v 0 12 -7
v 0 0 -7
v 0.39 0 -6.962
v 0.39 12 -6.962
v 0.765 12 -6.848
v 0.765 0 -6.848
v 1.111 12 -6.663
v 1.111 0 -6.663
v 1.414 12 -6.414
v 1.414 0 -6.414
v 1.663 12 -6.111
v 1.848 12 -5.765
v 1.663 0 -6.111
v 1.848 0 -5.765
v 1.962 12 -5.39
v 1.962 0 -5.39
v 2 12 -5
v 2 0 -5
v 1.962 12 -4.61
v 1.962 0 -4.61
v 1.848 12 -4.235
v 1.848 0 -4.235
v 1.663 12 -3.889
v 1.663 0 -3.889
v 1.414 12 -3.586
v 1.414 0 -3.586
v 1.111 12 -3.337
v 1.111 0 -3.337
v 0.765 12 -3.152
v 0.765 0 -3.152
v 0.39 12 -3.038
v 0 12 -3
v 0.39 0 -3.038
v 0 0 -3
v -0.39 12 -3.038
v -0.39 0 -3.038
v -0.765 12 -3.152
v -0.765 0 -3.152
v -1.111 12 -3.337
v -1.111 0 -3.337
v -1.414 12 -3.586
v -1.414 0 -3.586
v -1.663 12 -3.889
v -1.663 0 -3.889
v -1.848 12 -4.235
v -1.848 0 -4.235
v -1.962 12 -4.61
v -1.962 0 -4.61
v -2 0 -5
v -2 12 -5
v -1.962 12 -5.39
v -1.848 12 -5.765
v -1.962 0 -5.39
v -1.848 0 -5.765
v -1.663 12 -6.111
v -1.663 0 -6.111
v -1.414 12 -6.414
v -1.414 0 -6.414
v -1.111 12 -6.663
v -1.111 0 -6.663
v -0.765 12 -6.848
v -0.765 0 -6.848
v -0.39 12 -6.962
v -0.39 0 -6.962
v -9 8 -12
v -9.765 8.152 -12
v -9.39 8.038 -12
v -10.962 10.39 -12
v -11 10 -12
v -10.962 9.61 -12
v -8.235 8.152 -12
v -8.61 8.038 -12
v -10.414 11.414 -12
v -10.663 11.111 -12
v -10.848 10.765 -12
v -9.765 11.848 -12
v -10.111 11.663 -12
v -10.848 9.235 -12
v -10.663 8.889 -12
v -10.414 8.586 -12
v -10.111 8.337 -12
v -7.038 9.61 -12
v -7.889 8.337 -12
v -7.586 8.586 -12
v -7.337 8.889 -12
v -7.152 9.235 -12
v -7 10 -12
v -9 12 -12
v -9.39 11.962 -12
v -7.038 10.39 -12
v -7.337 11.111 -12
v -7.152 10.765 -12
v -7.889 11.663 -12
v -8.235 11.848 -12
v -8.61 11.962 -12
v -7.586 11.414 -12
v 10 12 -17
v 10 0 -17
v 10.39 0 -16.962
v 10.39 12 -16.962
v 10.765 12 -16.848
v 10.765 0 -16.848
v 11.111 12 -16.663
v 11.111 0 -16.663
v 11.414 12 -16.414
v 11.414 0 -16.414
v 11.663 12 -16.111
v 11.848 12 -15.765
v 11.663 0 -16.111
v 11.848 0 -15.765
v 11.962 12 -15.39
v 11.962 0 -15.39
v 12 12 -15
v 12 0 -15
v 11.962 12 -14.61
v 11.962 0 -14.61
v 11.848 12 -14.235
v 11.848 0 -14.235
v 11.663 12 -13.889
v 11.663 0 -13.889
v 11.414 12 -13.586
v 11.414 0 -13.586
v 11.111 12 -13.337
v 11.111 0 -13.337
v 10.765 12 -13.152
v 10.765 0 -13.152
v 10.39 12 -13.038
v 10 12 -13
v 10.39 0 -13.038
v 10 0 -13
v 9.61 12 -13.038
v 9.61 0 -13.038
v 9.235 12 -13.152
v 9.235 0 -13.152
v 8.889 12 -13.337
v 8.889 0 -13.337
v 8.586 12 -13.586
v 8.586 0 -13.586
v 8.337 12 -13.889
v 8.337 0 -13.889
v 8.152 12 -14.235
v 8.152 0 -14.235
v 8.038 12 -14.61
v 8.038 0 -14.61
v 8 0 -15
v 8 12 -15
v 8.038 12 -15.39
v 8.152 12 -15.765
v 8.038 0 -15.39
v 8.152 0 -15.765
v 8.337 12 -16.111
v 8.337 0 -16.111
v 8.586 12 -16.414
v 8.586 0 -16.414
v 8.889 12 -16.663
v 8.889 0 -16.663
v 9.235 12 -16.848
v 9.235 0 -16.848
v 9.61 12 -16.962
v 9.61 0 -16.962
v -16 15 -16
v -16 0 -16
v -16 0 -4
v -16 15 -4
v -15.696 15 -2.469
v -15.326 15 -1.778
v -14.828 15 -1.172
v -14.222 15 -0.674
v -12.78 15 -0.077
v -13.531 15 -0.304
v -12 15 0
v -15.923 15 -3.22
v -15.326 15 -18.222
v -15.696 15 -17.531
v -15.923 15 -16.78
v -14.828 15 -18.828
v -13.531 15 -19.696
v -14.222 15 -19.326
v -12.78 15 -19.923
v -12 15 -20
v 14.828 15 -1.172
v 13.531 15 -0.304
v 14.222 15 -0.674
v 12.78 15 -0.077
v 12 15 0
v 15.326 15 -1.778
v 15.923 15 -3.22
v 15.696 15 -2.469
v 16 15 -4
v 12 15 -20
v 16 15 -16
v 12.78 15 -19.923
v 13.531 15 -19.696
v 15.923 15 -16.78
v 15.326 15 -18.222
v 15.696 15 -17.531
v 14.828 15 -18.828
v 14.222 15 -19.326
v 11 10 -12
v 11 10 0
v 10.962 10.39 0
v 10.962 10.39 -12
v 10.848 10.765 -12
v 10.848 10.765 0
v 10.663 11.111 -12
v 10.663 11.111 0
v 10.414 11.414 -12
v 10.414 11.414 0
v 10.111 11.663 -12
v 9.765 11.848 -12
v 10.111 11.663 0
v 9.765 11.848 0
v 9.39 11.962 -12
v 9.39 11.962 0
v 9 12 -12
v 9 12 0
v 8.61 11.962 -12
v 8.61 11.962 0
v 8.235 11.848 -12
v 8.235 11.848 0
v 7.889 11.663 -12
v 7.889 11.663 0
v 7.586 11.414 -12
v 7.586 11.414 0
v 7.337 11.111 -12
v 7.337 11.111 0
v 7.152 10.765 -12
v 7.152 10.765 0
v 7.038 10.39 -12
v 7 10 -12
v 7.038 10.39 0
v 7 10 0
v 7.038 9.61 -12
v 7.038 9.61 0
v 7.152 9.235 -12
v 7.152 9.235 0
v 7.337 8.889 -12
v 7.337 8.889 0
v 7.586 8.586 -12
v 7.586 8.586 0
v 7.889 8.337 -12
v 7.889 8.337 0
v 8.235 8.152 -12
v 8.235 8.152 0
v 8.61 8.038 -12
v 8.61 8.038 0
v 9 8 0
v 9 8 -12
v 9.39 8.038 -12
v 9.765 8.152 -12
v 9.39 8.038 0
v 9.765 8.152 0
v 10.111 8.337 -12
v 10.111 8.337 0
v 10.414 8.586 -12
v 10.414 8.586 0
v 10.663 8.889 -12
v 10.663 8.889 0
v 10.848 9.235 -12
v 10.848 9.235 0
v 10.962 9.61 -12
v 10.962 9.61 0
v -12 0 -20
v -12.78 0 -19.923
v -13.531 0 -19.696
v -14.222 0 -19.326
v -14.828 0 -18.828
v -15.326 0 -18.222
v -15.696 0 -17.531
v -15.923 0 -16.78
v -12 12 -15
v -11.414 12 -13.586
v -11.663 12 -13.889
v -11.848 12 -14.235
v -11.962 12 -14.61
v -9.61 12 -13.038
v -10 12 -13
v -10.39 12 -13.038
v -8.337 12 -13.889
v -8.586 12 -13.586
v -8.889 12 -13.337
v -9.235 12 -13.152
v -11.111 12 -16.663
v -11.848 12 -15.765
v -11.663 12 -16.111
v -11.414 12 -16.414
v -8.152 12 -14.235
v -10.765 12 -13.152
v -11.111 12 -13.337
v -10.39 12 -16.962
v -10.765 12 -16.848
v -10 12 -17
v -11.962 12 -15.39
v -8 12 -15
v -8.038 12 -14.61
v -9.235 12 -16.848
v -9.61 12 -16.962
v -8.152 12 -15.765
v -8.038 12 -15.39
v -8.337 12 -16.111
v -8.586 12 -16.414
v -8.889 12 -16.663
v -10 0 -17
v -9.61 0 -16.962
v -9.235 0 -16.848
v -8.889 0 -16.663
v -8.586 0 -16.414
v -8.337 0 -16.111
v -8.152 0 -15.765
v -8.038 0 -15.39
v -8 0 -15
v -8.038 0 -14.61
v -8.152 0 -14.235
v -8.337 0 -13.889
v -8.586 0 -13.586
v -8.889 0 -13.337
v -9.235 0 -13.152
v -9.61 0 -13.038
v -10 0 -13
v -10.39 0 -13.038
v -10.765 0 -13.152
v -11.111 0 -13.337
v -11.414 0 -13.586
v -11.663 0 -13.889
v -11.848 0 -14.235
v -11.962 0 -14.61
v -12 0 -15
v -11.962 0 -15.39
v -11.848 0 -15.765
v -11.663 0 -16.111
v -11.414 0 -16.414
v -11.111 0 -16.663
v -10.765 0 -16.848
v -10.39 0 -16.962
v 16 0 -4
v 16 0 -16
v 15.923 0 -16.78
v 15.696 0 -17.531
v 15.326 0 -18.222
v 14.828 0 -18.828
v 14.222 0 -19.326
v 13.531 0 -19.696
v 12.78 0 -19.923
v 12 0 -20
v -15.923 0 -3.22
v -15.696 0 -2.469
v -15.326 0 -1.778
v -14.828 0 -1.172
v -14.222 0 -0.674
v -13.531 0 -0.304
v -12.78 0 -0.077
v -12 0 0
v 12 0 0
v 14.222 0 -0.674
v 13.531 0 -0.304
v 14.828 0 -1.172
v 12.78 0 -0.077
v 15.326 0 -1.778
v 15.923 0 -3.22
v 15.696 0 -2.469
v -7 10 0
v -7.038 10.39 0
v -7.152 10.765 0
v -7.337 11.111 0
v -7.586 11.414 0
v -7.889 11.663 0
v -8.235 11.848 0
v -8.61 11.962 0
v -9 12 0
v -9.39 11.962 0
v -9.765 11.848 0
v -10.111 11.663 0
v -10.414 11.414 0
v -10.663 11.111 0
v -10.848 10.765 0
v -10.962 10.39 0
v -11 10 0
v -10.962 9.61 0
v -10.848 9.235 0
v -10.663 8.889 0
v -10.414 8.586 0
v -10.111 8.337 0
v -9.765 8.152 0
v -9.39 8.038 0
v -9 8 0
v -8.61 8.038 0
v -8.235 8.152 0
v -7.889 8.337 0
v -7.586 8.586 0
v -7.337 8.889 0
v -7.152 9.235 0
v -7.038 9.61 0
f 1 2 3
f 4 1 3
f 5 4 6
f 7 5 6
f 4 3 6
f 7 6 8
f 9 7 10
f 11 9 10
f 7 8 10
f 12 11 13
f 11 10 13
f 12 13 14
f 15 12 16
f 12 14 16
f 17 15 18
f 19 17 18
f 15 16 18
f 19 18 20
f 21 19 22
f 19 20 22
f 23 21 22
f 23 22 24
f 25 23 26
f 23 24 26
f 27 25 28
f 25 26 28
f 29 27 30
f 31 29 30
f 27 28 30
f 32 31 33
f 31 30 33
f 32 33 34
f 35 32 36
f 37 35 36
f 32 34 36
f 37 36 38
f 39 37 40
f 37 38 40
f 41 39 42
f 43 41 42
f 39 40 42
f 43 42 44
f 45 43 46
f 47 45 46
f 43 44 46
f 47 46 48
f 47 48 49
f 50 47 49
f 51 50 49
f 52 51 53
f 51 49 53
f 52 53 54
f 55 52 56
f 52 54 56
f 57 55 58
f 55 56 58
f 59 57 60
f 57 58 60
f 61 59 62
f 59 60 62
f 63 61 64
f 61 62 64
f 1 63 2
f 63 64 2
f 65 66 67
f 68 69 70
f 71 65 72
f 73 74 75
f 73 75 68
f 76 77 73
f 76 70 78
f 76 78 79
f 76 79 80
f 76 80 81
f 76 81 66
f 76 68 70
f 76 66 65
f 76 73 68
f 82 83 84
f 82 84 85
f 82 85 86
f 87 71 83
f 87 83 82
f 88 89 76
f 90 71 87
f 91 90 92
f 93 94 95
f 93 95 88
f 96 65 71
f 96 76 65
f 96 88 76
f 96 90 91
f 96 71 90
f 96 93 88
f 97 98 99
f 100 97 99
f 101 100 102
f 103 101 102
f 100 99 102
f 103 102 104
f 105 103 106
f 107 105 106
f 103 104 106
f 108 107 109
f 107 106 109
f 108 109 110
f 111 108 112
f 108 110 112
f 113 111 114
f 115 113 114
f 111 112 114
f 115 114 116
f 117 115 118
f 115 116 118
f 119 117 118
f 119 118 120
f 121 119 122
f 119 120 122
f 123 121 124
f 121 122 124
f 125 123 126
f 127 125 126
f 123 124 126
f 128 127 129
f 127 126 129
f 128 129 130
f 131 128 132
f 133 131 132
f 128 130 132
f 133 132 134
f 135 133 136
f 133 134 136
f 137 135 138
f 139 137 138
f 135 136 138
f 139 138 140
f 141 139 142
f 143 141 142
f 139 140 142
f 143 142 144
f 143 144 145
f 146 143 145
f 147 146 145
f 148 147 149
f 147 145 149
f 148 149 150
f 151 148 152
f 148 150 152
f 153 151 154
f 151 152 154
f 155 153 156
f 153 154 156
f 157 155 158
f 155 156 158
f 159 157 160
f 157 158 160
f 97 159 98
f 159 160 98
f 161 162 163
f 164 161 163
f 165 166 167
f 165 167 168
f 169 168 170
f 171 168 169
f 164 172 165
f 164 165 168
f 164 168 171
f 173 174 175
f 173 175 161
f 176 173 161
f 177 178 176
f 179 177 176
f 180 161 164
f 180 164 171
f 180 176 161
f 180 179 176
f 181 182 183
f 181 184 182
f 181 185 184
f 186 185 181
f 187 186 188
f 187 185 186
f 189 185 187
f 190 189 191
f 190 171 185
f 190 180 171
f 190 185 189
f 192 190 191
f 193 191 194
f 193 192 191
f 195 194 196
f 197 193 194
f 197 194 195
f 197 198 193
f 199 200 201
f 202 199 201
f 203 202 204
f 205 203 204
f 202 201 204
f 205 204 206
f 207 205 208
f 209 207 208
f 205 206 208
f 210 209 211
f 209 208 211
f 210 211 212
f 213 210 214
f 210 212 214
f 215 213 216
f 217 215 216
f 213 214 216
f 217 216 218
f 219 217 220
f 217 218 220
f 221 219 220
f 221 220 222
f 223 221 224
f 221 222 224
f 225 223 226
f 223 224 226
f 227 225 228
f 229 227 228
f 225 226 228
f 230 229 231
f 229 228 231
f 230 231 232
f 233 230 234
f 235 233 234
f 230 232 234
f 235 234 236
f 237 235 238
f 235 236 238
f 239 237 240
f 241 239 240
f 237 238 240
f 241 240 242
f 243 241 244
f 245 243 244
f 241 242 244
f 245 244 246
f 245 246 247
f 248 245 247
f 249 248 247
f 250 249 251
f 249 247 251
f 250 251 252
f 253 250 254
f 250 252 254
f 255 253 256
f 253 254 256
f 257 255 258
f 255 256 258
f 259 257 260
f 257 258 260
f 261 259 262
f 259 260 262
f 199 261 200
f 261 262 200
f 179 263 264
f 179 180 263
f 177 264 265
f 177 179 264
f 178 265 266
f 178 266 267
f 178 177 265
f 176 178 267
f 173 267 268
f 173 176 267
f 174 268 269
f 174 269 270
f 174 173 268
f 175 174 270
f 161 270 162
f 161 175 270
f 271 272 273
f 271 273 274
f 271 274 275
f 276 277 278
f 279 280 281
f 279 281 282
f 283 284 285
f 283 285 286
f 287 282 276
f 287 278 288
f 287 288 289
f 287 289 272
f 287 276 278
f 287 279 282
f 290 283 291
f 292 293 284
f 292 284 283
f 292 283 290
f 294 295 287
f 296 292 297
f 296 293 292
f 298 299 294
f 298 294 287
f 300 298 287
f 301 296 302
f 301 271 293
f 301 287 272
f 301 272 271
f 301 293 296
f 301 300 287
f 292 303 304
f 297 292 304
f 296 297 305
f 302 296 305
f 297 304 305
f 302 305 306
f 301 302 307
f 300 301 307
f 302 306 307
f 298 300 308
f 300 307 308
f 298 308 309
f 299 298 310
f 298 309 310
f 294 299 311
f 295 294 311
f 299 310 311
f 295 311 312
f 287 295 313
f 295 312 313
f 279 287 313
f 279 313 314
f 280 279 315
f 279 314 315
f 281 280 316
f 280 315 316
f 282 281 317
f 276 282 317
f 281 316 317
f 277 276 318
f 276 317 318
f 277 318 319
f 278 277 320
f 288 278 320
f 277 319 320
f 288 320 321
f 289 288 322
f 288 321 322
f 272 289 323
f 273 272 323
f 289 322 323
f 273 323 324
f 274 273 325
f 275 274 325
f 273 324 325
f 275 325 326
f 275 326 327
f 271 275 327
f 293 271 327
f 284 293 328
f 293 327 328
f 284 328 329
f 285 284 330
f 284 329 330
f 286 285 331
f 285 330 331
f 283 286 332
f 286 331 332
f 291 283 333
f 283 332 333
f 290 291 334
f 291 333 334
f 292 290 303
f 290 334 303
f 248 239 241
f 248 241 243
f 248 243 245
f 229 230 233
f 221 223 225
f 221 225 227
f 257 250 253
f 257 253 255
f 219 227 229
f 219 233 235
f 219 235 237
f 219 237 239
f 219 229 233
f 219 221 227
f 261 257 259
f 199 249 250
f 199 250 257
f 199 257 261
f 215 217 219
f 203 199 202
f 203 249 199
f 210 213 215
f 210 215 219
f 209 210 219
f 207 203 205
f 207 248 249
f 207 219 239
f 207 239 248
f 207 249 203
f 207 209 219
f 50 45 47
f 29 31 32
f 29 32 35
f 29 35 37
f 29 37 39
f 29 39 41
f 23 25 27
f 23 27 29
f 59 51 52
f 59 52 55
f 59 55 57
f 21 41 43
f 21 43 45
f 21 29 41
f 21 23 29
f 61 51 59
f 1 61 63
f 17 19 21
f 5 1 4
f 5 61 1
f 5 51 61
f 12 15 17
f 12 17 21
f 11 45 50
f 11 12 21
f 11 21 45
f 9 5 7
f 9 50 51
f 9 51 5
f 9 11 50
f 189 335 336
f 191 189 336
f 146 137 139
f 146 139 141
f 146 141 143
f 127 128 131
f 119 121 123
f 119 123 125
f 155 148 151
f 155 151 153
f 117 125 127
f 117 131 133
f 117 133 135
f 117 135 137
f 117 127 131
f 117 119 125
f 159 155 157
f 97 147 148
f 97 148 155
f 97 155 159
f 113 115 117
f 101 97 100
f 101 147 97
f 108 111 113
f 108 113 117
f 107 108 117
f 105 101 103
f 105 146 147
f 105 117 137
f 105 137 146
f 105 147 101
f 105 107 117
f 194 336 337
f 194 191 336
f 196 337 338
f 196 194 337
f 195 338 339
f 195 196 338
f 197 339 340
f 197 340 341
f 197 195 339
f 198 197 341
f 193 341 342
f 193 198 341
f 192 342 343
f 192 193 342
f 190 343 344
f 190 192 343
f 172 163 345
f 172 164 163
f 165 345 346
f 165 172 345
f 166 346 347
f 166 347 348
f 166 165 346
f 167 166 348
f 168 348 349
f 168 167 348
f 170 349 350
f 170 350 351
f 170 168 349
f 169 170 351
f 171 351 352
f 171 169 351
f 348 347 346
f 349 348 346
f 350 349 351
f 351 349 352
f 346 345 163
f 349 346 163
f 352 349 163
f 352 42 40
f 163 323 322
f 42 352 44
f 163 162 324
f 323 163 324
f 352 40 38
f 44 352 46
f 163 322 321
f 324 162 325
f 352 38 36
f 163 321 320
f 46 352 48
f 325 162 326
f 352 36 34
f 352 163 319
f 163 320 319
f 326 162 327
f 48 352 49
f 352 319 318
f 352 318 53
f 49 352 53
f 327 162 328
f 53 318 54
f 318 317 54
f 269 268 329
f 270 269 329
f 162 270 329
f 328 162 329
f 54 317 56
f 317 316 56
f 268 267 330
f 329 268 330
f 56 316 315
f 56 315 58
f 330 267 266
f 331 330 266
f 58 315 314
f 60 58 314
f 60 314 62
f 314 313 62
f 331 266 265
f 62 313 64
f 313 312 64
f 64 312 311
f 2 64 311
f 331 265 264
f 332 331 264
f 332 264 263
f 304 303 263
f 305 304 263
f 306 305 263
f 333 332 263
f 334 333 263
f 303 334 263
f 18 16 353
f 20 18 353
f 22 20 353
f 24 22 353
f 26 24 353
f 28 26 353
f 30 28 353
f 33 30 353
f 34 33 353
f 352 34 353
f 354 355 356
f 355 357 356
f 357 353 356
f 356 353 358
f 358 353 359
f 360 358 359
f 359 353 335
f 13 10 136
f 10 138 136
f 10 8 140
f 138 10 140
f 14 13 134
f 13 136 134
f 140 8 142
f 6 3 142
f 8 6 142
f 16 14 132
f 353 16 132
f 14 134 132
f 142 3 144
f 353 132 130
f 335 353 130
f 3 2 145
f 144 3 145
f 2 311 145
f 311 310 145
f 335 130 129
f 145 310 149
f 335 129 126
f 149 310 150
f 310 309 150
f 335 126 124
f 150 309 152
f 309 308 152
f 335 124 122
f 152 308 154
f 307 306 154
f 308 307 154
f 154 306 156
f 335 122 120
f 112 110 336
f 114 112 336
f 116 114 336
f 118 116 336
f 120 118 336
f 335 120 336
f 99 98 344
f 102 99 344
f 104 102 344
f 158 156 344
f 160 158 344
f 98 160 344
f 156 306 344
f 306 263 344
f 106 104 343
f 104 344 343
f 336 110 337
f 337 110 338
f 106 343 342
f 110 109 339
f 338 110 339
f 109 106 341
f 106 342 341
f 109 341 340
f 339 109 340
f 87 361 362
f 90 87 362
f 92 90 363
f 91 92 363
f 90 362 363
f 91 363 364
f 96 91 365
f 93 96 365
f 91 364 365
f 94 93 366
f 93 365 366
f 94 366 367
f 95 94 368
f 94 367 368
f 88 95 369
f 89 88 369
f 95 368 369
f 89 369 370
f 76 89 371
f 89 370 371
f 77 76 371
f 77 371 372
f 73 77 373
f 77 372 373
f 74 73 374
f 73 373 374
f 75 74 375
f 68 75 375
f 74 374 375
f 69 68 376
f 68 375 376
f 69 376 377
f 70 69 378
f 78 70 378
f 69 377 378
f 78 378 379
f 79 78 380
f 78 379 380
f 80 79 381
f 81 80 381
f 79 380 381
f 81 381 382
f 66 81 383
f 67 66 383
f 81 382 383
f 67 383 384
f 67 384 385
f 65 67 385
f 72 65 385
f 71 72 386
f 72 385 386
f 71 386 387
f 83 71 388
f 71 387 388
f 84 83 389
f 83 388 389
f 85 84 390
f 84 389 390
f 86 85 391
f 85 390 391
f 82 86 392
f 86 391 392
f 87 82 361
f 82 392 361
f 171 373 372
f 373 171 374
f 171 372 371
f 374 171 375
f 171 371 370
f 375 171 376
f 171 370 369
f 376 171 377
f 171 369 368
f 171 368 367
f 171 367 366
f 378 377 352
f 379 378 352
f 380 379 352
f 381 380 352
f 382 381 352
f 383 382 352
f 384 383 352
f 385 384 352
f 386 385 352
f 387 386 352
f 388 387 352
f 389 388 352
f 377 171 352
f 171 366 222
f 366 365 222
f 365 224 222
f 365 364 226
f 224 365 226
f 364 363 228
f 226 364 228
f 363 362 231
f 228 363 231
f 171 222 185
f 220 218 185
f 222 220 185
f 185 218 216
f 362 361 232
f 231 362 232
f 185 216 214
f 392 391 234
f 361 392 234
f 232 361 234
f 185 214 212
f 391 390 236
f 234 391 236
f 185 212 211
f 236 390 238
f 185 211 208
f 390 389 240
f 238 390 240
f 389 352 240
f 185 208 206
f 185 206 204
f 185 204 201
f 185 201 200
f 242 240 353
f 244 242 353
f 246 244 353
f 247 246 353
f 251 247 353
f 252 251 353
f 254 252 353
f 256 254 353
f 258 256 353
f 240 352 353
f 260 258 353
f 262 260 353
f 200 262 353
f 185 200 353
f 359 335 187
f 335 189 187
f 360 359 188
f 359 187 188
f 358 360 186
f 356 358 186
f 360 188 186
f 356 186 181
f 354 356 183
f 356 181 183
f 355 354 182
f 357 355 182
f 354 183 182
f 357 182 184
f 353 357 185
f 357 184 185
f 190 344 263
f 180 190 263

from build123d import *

# Parameters (mm, degrees)
BOSS_EXTRU_1_DEPTH      = 15
CONG_1_R                = 4
ESQUISSE2_R             = 2
ENL_V_MAT_EXTRU_1_DEPTH = 12
ESQUISSE3_R             = 2
ENL_V_MAT_EXTRU_2_DEPTH = 12


with BuildPart() as part:
    # Esquisse1 → Boss.-Extru.1 (new body)
    with BuildSketch(Plane(origin=(0, 0, 0), x_dir=(1, 0, 0), z_dir=(0, 1, 0))):
        Polygon((0, 0), (16, 0), (16, 20), (-16, 20), (-16, 0), align=None)
    extrude(amount=BOSS_EXTRU_1_DEPTH)

    # Congé1
    cong_1_edges = [part.edges().sort_by_distance(p)[0] for p in [
        (-16, 7.5, 0),
        (-16, 7.5, -20),
        (16, 7.5, -20),
        (16, 7.5, 0),
    ]]
    fillet(cong_1_edges, radius=CONG_1_R)

    # Esquisse2 → Enlèv. mat.-Extru.1 (cut)
    with BuildSketch(Plane.XZ):
        with Locations(Location((-10, -15, 0), (0, 0, 270))):
            Circle(ESQUISSE2_R)
        with Locations(Location((10, -15, 0), (0, 0, 270))):
            Circle(ESQUISSE2_R)
        with Locations(Location((0, -5, 0), (0, 0, 270))):
            Circle(ESQUISSE2_R)
    extrude(amount=-ENL_V_MAT_EXTRU_1_DEPTH, mode=Mode.SUBTRACT)

    # Esquisse3 → Enlèv. mat.-Extru.2 (cut)
    with BuildSketch(Plane.XY):
        with Locations((-9, 10)):
            Circle(ESQUISSE3_R)
        with Locations((9, 10)):
            Circle(ESQUISSE3_R)
    extrude(amount=-ENL_V_MAT_EXTRU_2_DEPTH, mode=Mode.SUBTRACT)


solid = part.part
